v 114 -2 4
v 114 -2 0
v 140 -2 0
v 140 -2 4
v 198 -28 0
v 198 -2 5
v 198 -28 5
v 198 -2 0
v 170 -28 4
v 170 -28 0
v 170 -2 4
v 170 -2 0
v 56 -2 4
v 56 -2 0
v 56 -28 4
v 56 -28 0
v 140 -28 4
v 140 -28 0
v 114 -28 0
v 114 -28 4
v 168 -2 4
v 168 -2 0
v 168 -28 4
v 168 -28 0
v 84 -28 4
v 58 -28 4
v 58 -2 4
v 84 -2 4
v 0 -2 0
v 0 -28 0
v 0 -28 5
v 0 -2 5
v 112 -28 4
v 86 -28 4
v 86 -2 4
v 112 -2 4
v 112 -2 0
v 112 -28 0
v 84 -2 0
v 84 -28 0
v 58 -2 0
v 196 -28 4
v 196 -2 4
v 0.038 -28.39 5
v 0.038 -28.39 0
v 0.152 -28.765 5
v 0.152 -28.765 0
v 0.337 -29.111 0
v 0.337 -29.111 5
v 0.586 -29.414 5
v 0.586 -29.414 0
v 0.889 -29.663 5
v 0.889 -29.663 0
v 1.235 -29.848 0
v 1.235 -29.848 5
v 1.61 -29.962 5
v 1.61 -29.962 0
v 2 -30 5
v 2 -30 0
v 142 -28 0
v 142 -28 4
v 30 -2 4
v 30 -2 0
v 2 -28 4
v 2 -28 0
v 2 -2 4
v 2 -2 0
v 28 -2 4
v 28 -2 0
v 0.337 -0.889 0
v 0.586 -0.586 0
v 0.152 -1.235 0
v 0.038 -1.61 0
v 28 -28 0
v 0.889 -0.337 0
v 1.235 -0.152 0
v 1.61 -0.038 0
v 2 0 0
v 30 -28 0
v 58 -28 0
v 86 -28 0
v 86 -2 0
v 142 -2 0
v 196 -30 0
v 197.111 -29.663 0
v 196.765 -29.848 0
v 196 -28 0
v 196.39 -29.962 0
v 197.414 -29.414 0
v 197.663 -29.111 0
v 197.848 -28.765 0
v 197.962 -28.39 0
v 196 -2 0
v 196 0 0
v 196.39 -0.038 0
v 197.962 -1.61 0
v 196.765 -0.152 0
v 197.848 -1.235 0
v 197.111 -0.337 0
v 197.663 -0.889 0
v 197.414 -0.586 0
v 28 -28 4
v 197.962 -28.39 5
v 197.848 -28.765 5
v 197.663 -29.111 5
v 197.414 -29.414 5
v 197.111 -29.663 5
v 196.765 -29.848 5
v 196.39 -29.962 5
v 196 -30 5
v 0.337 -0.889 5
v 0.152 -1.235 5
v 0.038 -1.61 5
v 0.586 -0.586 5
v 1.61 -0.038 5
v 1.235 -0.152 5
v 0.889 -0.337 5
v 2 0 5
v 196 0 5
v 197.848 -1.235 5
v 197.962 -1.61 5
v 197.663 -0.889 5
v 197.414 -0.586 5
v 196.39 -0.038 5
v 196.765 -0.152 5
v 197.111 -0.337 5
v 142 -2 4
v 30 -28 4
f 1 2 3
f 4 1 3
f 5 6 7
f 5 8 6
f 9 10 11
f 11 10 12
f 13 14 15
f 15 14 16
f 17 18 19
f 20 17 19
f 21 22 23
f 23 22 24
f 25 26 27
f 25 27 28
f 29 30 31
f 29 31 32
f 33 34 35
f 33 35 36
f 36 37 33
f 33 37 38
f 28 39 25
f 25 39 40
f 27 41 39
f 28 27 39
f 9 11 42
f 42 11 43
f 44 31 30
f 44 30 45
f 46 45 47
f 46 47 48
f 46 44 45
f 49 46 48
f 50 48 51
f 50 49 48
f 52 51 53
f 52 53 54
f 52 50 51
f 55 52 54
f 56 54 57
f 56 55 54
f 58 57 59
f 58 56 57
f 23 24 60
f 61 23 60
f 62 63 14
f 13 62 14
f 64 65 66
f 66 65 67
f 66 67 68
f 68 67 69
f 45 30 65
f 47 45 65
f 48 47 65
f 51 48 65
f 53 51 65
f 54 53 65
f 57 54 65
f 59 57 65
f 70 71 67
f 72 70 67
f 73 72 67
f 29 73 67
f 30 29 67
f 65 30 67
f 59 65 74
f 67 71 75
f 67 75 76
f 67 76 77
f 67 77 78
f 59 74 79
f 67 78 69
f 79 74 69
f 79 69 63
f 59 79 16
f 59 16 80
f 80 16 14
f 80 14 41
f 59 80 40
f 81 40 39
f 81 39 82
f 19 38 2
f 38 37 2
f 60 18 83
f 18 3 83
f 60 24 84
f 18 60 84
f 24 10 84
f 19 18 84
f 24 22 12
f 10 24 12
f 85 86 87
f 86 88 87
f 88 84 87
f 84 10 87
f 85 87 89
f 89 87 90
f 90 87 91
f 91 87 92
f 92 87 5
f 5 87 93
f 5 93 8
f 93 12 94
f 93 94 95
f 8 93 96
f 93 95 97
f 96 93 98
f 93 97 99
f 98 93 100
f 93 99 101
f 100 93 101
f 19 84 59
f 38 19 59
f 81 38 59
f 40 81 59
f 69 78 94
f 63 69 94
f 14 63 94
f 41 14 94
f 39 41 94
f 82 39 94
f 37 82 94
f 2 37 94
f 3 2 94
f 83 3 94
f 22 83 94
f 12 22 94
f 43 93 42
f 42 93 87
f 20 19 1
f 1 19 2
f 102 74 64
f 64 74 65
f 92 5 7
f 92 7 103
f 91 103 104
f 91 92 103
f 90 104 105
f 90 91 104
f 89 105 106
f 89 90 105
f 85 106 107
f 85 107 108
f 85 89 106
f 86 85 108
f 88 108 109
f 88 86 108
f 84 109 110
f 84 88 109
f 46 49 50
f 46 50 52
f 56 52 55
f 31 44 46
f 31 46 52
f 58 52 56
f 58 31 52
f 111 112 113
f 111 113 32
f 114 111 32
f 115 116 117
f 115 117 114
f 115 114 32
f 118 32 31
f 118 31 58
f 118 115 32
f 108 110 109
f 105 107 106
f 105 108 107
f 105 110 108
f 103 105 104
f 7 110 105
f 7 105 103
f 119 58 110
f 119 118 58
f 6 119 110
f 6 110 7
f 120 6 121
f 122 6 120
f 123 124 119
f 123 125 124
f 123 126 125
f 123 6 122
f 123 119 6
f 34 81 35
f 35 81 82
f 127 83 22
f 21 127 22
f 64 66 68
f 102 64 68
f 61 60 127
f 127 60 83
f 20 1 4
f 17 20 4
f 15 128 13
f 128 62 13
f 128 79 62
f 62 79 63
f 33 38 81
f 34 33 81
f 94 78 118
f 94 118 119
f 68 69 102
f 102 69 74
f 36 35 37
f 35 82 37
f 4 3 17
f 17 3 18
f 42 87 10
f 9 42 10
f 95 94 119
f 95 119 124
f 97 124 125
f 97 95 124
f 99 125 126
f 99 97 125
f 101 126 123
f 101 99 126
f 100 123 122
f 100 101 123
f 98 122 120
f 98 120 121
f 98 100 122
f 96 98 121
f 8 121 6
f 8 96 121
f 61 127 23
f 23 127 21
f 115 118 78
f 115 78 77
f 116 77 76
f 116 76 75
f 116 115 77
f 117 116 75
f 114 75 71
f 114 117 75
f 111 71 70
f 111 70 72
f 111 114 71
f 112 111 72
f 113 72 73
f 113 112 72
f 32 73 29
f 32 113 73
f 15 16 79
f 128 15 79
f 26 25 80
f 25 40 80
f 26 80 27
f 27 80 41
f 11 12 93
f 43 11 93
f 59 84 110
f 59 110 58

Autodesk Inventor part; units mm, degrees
ref_plane "YZ Plane" through (0, 0, 0) normal (1, 0, 0) x (0, 1, 0)
ref_plane "XZ Plane" through (0, 0, 0) normal (0, 1, 0) x (-1, 0, 0)
ref_plane "XY Plane" through (0, 0, 0) normal (0, 0, 1) x (1, 0, 0)
sketch "스케치1" plane through (0, 0, 0) normal (0, 0, 1) x (1, 0, 0)
  point P0 (0, 0)
sketch "스케치2" plane through (0, 0, 0) normal (0, 0, 1) x (1, 0, 0)
  line L0 (0, 0) -> (198, 0)
  line L1 (198, 0) -> (198, -30)
  line L2 (198, -30) -> (0, -30)
  line L3 (0, -30) -> (0, 0)
  line L4 (2, -2) -> (28, -2)
  line L5 (28, -2) -> (28, -28)
  line L6 (28, -28) -> (2, -28)
  line L7 (2, -28) -> (2, -2)
  line L8 (56, -2) -> (56, -28)
  line L9 (30, -2) -> (56, -2)
  line L10 (30, -28) -> (30, -2)
  line L11 (56, -28) -> (30, -28)
  line L12 (84, -2) -> (84, -28)
  line L13 (58, -2) -> (84, -2)
  line L14 (58, -28) -> (58, -2)
  line L15 (84, -28) -> (58, -28)
  line L16 (112, -2) -> (112, -28)
  line L17 (86, -2) -> (112, -2)
  line L18 (86, -28) -> (86, -2)
  line L19 (112, -28) -> (86, -28)
  line L20 (140, -2) -> (140, -28)
  line L21 (114, -2) -> (140, -2)
  line L22 (114, -28) -> (114, -2)
  line L23 (140, -28) -> (114, -28)
  line L24 (168, -2) -> (168, -28)
  line L25 (142, -2) -> (168, -2)
  line L26 (142, -28) -> (142, -2)
  line L27 (168, -28) -> (142, -28)
  line L28 (196, -2) -> (196, -28)
  line L29 (170, -2) -> (196, -2)
  line L30 (170, -28) -> (170, -2)
  line L31 (196, -28) -> (170, -28)
  dimension "d0" = 198
  dimension "d1" = 30
  dimension "d2" = 2
  dimension "d3" = 2
  dimension "d4" = 26
  dimension "d5" = 26
  dimension "d8" = 28
extrude "돌출1" add sketch "스케치2" along normal blind 4
sketch "스케치3" plane through (0, 0, 4) normal (0, 0, 1) x (1, 0, 0)
  line L0 (0, -30) -> (198, -30) projected
  line L1 (198, -30) -> (198, 0) projected
  line L2 (198, 0) -> (0, 0) projected
  line L3 (0, 0) -> (0, -30) projected
  line L4 (196, -2) -> (196, -28) projected
  line L5 (196, -28) -> (170, -28) projected
  line L6 (170, -28) -> (170, -2) projected
  line L7 (170, -2) -> (196, -2) projected
  line L8 (168, -2) -> (168, -28) projected
  line L9 (168, -28) -> (142, -28) projected
  line L10 (142, -28) -> (142, -2) projected
  line L11 (142, -2) -> (168, -2) projected
  line L12 (140, -2) -> (140, -28) projected
  line L13 (140, -28) -> (114, -28) projected
  line L14 (114, -28) -> (114, -2) projected
  line L15 (114, -2) -> (140, -2) projected
  line L16 (112, -2) -> (112, -28) projected
  line L17 (112, -28) -> (86, -28) projected
  line L18 (86, -28) -> (86, -2) projected
  line L19 (86, -2) -> (112, -2) projected
  line L20 (84, -2) -> (84, -28) projected
  line L21 (84, -28) -> (58, -28) projected
  line L22 (58, -28) -> (58, -2) projected
  line L23 (58, -2) -> (84, -2) projected
  line L24 (56, -2) -> (56, -28) projected
  line L25 (56, -28) -> (30, -28) projected
  line L26 (30, -28) -> (30, -2) projected
  line L27 (30, -2) -> (56, -2) projected
  line L28 (2, -2) -> (28, -2) projected
  line L29 (28, -2) -> (28, -28) projected
  line L30 (28, -28) -> (2, -28) projected
  line L31 (2, -28) -> (2, -2) projected
extrude "돌출2" add sketch "스케치3" along normal blind 1 contours L3 L2 L1 L0 | L4 L5 L6 L7 | L8 L9 L10 L11 | L12 L13 L14 L15 | L16 L17 L18 L19 | L20 L21 L22 L23 | L24 L25 L26 L27 | L28 L29 L30 L31
fillet "모깎기1" radius 2 4 edges at (198, 0, 2.5) (198, -30, 2.5) (0, -30, 2.5) (0, 0, 2.5)
properties part number "h_pocket"
